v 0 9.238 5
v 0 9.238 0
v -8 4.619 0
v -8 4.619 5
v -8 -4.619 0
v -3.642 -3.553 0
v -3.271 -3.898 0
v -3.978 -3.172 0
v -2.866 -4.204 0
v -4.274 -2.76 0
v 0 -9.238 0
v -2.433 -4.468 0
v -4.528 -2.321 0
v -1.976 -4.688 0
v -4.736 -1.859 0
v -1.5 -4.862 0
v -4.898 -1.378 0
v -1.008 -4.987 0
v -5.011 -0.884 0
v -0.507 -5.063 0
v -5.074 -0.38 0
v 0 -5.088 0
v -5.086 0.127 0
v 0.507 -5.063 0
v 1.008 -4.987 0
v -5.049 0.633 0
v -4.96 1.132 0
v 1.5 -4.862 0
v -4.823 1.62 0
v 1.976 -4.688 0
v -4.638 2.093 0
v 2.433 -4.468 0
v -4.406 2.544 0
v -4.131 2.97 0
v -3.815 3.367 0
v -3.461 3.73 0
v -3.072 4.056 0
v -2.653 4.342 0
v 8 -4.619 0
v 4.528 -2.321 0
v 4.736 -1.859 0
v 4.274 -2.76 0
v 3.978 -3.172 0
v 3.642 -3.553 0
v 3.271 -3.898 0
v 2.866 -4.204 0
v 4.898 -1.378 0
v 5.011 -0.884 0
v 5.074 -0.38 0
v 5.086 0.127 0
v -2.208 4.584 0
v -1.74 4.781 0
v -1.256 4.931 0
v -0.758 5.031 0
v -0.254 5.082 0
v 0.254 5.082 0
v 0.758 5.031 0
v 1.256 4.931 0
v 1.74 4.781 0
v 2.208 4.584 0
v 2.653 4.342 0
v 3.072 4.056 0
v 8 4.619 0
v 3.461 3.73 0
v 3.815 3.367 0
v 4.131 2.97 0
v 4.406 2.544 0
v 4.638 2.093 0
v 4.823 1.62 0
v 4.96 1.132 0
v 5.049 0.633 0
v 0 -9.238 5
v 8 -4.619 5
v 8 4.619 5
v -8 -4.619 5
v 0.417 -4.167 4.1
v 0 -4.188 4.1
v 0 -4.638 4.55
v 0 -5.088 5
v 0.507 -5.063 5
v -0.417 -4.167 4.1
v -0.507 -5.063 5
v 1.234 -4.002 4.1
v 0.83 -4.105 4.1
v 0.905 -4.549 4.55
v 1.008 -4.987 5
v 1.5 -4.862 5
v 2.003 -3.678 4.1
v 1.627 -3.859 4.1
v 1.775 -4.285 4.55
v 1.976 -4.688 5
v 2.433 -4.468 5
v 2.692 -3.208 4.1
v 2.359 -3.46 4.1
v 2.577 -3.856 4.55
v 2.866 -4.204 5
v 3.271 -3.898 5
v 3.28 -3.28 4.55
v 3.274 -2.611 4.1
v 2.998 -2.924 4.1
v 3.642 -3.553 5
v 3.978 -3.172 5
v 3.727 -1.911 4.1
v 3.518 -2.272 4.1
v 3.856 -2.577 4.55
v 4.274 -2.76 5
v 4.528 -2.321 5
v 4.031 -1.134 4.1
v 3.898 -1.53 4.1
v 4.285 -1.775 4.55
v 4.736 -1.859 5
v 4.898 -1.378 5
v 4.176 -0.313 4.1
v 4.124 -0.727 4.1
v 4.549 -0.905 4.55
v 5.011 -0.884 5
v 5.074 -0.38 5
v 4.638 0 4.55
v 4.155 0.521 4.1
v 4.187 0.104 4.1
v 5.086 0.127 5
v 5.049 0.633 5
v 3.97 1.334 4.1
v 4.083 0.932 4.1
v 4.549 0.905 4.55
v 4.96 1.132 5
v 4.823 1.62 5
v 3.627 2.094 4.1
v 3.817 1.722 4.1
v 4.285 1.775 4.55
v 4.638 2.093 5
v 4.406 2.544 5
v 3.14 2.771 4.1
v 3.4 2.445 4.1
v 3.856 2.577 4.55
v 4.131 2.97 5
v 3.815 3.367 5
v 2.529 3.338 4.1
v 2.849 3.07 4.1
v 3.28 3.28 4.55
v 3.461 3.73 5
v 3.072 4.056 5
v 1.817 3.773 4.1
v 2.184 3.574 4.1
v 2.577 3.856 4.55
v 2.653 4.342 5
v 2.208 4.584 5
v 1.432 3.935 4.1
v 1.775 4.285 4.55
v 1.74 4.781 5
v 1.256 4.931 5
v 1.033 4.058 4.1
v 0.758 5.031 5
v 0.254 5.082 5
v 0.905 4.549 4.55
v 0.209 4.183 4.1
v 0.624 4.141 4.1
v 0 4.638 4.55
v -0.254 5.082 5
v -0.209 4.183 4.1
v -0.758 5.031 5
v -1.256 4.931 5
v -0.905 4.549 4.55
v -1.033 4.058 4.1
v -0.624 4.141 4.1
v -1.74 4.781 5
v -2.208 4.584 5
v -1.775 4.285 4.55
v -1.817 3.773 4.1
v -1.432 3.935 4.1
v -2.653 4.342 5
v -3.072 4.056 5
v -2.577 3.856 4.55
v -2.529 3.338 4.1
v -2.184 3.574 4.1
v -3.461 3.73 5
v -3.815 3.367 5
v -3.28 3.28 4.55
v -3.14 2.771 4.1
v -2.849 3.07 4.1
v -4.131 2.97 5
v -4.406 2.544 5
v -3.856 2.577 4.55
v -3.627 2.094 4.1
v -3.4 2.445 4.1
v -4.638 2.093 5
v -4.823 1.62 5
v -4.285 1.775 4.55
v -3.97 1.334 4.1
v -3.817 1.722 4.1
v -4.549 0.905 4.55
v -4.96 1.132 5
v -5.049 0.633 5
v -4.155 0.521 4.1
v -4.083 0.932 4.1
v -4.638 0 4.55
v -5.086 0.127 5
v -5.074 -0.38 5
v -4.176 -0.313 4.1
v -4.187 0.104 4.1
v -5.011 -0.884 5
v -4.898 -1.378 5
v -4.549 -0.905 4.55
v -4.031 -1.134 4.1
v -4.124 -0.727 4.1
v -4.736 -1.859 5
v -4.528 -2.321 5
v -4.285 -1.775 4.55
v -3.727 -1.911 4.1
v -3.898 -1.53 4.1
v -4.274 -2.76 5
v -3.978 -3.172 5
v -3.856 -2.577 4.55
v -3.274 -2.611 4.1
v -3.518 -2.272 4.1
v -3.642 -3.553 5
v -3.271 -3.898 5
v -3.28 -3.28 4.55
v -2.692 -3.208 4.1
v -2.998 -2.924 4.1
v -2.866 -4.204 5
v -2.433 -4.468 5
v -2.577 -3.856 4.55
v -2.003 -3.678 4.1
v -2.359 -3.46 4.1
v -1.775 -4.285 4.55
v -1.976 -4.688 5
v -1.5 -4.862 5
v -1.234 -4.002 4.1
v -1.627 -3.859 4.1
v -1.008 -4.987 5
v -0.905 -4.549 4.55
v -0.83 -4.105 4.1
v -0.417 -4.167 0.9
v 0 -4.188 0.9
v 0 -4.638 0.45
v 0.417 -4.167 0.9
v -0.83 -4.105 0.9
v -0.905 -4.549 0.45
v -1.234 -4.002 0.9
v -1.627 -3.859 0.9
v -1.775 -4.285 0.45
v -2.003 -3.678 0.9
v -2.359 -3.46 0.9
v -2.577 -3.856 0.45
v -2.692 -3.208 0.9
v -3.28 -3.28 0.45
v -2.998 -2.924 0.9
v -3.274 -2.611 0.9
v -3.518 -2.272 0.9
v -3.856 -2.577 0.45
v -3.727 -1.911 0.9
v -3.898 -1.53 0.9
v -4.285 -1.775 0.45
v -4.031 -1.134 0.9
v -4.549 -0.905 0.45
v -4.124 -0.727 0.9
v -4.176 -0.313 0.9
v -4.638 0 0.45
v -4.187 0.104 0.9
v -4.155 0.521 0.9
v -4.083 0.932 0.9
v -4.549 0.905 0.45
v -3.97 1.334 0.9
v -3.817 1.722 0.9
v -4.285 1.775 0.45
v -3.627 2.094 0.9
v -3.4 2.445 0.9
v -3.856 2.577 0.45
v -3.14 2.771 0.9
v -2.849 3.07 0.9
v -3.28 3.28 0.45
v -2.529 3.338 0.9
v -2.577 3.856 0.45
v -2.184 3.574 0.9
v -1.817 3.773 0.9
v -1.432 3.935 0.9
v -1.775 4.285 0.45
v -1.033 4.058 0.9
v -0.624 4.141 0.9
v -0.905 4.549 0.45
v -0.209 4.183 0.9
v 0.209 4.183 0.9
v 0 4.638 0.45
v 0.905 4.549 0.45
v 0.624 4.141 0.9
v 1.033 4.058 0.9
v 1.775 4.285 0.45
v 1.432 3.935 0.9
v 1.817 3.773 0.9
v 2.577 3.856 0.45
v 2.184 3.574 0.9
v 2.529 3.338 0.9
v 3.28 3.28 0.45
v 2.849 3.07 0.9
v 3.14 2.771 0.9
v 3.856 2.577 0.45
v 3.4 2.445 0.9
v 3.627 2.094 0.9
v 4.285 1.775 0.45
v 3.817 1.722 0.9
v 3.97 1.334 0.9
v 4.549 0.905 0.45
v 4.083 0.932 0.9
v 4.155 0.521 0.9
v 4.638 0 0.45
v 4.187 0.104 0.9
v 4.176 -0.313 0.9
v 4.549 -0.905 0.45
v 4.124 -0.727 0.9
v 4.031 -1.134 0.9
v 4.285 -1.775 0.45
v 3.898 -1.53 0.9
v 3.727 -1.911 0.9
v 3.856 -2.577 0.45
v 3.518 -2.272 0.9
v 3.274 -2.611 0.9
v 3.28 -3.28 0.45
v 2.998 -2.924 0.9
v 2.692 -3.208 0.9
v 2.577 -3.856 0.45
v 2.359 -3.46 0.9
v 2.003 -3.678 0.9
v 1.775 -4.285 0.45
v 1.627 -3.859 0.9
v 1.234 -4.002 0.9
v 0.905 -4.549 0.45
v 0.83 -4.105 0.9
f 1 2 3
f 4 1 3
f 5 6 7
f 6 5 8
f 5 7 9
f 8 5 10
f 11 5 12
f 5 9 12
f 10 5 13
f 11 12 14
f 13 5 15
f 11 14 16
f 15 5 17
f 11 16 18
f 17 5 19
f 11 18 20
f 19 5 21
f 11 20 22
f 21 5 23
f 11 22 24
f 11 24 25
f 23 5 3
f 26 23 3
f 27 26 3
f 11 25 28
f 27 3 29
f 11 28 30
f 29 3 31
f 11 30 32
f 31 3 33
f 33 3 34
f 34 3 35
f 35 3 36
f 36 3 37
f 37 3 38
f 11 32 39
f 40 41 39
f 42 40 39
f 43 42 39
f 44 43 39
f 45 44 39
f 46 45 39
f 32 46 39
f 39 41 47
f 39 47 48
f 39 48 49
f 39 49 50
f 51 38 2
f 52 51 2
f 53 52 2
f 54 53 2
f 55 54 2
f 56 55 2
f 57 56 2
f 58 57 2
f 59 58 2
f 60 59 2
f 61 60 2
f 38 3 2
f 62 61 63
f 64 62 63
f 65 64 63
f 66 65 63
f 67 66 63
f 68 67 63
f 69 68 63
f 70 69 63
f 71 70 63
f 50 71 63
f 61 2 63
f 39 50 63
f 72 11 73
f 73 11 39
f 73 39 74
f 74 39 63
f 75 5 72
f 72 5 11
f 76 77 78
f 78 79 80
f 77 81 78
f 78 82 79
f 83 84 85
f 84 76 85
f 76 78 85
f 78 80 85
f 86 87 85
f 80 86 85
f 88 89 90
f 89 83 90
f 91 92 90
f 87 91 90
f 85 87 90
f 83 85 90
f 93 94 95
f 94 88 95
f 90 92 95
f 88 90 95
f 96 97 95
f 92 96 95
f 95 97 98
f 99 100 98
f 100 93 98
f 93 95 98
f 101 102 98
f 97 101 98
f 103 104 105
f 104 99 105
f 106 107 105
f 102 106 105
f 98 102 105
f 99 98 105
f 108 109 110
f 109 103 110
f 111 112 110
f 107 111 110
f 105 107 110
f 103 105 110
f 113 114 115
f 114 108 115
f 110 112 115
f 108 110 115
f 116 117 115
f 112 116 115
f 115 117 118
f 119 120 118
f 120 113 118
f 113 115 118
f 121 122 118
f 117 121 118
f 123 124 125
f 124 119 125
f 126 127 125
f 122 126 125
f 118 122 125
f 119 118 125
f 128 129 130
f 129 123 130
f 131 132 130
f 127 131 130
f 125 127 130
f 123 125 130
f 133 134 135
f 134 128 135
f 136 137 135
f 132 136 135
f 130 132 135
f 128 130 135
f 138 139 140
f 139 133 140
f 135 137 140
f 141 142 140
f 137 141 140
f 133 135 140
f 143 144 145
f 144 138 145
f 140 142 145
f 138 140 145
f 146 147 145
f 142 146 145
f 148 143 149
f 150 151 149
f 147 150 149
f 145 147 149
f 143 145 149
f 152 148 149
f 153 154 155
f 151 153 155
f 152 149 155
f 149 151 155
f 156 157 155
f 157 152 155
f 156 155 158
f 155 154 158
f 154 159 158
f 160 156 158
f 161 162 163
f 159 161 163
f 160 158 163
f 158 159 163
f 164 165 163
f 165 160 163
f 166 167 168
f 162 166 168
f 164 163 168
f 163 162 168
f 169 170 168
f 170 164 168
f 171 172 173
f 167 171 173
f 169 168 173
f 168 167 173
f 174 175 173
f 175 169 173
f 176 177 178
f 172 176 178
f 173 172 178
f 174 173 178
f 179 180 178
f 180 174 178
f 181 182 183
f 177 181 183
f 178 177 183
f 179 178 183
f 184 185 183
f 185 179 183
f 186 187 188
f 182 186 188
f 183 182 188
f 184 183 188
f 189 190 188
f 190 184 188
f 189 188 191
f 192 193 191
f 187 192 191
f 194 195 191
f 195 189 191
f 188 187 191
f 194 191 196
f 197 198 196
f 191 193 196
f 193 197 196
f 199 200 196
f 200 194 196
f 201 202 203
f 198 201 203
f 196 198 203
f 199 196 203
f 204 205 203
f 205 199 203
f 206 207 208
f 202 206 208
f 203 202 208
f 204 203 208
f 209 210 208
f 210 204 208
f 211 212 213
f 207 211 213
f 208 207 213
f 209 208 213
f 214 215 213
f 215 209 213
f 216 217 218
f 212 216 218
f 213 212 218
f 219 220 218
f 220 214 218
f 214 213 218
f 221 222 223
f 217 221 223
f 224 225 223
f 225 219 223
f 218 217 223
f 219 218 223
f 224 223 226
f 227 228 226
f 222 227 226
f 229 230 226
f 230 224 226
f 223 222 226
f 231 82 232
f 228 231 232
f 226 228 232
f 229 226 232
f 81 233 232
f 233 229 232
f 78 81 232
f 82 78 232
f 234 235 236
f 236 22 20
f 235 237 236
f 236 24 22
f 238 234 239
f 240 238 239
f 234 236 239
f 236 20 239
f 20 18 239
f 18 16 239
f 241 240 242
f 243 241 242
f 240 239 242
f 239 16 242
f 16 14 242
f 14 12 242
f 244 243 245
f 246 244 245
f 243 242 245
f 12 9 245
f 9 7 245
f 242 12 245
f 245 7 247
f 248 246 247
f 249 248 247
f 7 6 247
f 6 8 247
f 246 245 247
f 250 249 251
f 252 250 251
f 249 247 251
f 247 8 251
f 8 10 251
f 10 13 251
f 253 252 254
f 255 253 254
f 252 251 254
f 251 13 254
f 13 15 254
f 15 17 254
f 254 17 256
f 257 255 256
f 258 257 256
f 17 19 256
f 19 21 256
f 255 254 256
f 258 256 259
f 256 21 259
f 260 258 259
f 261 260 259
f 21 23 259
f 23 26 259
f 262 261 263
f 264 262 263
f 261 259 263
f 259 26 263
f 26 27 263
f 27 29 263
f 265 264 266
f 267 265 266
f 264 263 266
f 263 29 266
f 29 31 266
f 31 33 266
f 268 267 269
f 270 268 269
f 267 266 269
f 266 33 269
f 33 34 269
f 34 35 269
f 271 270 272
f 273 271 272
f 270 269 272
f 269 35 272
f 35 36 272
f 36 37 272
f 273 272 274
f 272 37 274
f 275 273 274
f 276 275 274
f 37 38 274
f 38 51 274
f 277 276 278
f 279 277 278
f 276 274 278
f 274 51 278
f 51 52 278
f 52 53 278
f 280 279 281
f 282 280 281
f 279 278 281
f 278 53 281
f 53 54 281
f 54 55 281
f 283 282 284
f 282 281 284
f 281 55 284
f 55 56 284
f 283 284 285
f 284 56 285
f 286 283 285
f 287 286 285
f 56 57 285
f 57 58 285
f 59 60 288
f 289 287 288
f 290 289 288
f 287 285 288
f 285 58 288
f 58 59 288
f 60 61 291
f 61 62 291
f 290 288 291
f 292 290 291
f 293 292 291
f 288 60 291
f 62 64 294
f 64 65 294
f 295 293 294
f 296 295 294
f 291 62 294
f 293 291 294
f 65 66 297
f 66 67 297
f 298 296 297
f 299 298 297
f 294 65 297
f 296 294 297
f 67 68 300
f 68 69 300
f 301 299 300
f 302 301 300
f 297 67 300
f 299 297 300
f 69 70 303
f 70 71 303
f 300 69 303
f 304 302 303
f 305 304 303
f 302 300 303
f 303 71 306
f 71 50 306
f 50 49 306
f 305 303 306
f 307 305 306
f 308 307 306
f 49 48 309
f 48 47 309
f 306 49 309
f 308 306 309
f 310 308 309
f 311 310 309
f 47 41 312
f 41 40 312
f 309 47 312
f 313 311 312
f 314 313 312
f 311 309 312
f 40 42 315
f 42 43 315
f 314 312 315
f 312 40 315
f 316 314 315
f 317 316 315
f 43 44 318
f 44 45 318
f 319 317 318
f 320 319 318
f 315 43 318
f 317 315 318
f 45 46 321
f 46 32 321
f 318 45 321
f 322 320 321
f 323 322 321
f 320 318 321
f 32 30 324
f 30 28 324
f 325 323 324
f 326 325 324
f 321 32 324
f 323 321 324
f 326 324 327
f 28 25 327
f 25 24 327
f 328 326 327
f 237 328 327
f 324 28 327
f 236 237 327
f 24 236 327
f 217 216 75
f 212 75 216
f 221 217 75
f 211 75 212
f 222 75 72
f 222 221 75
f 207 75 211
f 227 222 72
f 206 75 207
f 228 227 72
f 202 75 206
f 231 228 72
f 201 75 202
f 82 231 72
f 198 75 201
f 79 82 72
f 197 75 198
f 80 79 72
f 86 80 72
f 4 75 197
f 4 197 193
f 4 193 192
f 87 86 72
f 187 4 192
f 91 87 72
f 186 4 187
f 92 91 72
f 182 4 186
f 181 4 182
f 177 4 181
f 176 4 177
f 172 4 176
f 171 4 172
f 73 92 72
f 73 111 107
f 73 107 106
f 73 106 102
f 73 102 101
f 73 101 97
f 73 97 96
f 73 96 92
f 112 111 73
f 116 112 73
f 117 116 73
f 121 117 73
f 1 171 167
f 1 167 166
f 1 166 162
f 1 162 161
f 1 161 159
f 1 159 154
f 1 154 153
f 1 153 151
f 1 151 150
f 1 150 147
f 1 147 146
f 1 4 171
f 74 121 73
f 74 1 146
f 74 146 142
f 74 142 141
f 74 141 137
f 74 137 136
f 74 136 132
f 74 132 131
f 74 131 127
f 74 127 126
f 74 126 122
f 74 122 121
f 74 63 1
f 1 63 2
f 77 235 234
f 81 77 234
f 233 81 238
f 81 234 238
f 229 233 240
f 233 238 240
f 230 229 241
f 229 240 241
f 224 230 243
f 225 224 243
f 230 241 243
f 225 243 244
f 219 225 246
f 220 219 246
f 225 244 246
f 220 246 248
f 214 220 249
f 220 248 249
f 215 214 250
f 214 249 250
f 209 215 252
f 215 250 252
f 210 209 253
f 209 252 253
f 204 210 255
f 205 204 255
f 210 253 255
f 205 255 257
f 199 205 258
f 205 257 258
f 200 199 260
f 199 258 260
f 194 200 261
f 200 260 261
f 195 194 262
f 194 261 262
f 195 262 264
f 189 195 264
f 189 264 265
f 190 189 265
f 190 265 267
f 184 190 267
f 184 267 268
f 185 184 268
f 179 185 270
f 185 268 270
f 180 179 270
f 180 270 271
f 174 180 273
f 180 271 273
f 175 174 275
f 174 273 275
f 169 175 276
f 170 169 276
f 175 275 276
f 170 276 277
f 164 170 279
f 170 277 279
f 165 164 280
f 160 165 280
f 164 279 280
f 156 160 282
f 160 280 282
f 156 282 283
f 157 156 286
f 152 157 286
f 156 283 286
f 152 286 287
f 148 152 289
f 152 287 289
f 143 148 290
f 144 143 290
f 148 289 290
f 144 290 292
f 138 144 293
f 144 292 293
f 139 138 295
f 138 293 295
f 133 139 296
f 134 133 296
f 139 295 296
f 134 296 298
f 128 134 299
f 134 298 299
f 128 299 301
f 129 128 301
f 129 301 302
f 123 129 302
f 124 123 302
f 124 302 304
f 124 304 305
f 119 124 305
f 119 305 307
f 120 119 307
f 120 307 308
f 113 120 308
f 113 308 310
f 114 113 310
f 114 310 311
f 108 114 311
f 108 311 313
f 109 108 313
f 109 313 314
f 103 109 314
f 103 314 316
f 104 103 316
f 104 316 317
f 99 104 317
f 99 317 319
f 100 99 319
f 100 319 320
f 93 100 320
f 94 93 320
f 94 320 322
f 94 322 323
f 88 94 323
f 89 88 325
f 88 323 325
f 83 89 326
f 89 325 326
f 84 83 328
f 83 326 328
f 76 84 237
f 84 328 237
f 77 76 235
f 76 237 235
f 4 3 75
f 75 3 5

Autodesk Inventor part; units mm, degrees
sketch "Sketch1" plane through (0, 0, 0) normal (0, 0, 1) x (1, 0, 0)
  circle A0 centre (0, 0) radius 8 construction
  line L0 (-8, 4.6188) -> (-8, -4.6188)
  line L1 (-8, -4.6188) -> (0, -9.2376)
  line L2 (0, -9.2376) -> (8, -4.6188)
  line L3 (8, -4.6188) -> (8, 4.6188)
  line L4 (8, 4.6188) -> (0, 9.2376)
  line L5 (0, 9.2376) -> (-8, 4.6188)
  line L6 (0, 12.9326) -> (0, -12.9326) projected
  line L7 (-11.2, 0) -> (11.2, 0) projected
  point P0 (0, 0)
  dimension "ParS" = 16
extrude "Extrusion1" add sketch "Sketch1" along normal blind 5
sketch "Sketch2" plane through (0, 0, 5) normal (0, 0, 1) x (1, 0, 0)
  point P0 (0, 0)
  point P1 (0, 0)
hole "Hole1" at (0, 0, 5) direction (0, 0, -1) diameter 8.376 end through all thread size "M10x1.5" class "6H" standard "ISO Metric profile"
ref_plane "MSC_PT1" through (0, 0, 5) normal (0, 0, 1) x (1, 0, 0)
ref_plane "MSC_PT2" through (0, 0, 0) normal (0, 0, -1) x (-1, 0, 0)
ref_plane "MSC_PF1" through (0, 0, 0) normal (1, 0, 0) x (0, 1, 0)
chamfer "Chamfer1" distance 0.9 angle 45 2 edges at (0, 4.188, 5) (0, 4.188, 0)
equation "\"d17\" = 0.6 * PTC"
equation "\"d18\" = 0.6 * PTC"
equation "\"d4\" = M"
equation "\"PTC\" = 1.5"
properties part number "ISO 4036 - M10" material "Steel"
